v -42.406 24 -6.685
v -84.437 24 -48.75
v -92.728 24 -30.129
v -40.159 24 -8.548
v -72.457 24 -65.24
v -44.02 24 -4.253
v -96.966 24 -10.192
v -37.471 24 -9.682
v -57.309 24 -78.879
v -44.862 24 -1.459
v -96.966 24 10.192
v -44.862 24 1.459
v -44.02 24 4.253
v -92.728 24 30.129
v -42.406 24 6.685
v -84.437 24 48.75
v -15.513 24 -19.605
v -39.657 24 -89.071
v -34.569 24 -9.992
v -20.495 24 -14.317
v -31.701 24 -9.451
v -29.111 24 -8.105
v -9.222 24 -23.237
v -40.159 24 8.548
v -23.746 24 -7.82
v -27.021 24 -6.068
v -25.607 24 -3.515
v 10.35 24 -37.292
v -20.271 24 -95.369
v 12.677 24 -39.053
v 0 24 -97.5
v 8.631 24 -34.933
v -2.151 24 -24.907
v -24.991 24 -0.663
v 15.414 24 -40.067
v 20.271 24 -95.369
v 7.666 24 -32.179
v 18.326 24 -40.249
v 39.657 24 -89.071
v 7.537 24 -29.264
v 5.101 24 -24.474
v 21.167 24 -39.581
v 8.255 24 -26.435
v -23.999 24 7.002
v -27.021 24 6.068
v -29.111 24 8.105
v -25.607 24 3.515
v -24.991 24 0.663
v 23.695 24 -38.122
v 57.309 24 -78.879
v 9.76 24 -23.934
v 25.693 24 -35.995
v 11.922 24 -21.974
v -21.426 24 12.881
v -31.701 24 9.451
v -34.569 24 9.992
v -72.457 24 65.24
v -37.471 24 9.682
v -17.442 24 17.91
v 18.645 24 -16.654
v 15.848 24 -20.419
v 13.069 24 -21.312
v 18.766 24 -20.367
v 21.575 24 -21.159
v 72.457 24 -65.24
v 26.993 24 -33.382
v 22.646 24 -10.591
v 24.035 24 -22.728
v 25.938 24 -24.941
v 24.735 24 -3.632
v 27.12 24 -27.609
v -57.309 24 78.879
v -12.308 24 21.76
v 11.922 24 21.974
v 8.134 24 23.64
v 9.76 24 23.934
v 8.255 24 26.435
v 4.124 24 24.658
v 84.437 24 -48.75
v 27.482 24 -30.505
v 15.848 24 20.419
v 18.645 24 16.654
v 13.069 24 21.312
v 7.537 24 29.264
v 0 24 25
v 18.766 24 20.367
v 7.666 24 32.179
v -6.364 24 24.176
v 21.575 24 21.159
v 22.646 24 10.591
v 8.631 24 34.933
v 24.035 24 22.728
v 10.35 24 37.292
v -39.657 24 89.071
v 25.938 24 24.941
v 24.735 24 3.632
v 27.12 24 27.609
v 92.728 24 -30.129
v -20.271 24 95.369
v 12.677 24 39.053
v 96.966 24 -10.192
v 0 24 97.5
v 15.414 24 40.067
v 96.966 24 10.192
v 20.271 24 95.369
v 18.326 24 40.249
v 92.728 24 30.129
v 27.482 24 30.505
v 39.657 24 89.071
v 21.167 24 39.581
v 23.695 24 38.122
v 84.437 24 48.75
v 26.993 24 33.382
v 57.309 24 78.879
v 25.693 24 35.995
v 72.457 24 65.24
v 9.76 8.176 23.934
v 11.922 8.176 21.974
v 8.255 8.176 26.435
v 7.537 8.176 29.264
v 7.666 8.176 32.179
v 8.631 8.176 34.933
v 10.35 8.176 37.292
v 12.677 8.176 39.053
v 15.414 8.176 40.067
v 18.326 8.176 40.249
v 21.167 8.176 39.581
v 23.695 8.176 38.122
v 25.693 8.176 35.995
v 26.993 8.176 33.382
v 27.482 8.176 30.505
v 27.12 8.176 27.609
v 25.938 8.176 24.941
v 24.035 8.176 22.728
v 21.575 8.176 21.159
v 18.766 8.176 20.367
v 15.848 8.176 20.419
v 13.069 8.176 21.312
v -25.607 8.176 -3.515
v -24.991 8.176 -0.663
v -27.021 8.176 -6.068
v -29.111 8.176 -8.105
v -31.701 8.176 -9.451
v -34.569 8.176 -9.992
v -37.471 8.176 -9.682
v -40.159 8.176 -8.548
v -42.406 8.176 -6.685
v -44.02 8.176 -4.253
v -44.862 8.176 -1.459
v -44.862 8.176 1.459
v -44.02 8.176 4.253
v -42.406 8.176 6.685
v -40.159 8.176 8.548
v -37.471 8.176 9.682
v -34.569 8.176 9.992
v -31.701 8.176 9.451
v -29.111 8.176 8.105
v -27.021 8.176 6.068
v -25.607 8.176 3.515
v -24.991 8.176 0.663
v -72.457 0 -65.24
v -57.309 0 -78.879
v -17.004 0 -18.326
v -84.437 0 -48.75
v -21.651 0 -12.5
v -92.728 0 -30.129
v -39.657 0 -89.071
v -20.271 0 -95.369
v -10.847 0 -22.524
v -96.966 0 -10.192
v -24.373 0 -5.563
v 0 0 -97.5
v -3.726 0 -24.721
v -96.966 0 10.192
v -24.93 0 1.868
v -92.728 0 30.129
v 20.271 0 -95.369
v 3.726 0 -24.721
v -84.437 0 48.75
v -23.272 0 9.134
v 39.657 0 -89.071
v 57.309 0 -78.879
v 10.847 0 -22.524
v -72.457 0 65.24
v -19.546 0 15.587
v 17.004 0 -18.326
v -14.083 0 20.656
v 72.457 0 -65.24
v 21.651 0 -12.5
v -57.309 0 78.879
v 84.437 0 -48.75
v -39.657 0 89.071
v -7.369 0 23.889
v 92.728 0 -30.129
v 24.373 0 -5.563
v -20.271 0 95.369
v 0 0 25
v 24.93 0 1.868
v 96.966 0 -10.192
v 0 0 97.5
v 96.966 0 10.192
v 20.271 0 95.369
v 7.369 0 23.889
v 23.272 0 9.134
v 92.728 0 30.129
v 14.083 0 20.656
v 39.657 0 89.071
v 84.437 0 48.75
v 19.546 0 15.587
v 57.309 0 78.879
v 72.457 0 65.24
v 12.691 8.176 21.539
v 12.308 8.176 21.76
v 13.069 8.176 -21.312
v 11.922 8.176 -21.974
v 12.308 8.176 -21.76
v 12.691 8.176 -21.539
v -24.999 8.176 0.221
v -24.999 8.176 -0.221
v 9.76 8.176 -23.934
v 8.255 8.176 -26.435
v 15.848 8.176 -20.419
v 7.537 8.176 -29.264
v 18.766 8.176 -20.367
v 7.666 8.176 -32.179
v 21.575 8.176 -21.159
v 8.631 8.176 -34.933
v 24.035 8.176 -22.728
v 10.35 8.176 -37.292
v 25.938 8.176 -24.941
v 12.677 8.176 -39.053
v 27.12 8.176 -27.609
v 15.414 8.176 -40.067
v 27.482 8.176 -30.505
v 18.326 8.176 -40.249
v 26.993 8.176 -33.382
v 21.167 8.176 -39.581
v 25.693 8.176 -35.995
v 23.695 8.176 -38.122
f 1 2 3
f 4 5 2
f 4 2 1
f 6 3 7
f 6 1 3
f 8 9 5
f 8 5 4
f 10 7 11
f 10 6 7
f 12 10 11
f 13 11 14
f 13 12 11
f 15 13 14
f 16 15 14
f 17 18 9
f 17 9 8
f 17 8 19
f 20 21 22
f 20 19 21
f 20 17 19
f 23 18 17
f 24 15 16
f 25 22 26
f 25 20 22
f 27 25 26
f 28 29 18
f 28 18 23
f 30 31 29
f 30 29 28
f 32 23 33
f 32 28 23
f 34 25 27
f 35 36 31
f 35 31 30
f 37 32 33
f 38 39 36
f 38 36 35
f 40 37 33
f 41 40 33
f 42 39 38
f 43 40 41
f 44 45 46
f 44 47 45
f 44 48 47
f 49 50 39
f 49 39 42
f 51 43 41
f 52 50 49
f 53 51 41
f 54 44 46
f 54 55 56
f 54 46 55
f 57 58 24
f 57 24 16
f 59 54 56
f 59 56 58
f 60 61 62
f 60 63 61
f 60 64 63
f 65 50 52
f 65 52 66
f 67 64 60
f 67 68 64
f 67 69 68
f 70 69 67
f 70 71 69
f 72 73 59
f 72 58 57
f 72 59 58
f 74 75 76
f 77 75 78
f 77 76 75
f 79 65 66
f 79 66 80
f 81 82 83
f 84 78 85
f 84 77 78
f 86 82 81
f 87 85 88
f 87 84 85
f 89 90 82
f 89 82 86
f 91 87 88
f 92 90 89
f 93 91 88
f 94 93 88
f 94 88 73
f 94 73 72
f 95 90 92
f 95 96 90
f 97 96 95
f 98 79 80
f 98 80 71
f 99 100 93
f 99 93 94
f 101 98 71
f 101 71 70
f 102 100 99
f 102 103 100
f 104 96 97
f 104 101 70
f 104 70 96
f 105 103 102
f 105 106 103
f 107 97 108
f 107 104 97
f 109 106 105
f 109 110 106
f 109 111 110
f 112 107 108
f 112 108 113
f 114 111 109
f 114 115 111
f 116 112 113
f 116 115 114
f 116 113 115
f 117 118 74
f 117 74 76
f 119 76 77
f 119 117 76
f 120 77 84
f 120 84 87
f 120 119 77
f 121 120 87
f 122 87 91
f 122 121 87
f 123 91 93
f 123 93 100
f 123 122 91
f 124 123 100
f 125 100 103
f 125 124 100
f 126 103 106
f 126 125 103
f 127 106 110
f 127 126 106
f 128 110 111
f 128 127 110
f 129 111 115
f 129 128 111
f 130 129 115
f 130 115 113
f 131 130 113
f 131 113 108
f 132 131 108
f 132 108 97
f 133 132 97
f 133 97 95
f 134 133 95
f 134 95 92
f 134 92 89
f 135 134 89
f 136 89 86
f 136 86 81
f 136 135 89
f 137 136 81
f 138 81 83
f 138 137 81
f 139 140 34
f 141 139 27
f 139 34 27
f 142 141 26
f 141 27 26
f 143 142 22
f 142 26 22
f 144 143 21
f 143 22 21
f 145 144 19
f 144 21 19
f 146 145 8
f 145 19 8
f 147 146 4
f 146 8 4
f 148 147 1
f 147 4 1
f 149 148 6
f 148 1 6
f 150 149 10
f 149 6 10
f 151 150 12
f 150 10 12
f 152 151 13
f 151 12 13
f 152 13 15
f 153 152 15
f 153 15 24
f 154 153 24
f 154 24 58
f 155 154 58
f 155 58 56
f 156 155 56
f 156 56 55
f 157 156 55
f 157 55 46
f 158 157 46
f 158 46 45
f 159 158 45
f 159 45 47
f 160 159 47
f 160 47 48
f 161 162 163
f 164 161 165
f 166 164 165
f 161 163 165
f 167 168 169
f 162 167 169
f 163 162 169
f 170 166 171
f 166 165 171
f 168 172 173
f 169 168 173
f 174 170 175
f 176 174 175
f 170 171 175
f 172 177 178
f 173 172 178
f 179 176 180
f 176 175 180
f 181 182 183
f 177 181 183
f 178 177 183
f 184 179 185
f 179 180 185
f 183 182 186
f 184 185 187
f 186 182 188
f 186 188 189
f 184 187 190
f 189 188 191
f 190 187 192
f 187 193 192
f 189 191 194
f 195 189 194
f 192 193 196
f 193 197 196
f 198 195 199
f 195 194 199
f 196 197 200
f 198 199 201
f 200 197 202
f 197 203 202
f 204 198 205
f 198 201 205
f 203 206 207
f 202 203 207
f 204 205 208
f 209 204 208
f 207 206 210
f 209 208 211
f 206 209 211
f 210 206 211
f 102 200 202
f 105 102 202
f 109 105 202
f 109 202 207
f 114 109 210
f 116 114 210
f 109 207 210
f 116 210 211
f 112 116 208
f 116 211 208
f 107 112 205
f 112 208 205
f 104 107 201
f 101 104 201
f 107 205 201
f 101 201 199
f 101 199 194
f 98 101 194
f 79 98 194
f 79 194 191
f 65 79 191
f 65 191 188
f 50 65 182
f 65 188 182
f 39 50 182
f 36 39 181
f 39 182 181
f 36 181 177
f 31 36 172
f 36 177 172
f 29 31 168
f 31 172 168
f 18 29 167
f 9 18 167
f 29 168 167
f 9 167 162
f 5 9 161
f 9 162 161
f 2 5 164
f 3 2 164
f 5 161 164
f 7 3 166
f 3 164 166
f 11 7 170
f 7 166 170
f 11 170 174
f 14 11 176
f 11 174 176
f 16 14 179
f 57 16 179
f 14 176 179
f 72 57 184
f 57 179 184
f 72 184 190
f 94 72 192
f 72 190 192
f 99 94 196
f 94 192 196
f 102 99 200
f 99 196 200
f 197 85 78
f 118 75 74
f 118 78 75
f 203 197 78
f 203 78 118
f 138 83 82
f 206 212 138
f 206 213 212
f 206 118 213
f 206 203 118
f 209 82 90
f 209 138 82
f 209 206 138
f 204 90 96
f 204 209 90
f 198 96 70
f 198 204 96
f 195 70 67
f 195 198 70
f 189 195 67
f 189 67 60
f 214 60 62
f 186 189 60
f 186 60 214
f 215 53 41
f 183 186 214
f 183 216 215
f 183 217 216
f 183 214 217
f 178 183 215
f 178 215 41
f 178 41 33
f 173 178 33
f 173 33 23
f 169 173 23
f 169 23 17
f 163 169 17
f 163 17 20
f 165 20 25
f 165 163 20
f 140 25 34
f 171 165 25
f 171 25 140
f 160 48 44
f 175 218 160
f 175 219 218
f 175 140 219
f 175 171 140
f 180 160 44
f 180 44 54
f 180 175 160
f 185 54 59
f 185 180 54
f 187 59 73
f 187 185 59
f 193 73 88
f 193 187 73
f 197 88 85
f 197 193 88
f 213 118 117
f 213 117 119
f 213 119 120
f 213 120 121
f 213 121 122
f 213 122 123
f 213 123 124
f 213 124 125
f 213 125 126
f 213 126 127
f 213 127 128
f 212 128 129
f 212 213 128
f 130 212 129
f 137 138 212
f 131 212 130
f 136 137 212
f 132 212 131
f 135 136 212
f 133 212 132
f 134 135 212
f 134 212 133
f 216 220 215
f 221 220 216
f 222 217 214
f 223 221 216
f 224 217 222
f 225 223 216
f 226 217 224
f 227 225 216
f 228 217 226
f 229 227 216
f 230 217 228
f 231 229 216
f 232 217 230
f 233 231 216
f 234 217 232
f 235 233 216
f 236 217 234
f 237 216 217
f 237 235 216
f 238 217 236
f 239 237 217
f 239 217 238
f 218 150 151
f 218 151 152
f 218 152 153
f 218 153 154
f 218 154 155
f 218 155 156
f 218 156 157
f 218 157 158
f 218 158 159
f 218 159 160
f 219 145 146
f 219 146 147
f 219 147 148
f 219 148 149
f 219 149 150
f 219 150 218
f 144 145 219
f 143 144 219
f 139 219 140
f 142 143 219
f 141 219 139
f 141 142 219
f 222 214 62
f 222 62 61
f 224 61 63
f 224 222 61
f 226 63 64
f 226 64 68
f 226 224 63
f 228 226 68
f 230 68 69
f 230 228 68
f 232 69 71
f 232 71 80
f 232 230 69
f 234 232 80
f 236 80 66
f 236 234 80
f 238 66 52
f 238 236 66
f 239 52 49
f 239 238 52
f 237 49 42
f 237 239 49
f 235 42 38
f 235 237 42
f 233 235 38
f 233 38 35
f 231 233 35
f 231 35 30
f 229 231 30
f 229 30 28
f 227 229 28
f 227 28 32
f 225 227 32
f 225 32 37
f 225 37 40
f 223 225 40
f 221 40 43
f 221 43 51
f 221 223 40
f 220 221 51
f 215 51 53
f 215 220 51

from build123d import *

# Parameters (mm, degrees)
SKETCH1_R           = 97.5
BOSS_EXTRUDE1_DEPTH = 24
SKETCH2_R           = 25
CUT_EXTRUDE1_DEPTH  = 140.958922545
SKETCH3_R           = 10
CUT_EXTRUDE2_DEPTH  = 15.823761425
CIRPATTERN1_COUNT   = 3


with BuildPart() as part:
    # Sketch1 → Boss-Extrude1 (new body)
    with BuildSketch(Plane(origin=(0, 0, 0), x_dir=(1, 0, 0), z_dir=(0, 1, 0))):
        Circle(SKETCH1_R)
    extrude(amount=BOSS_EXTRUDE1_DEPTH)

    # Sketch2 → Cut-Extrude1 (cut, through all)
    with BuildSketch(Plane(origin=(0, 0, 0), x_dir=(1, 0, 0), z_dir=(0, 1, 0))):
        Circle(SKETCH2_R)
    extrude(amount=CUT_EXTRUDE1_DEPTH, mode=Mode.SUBTRACT)

    # Sketch3 → Cut-Extrude2 (cut)
    with BuildSketch(Plane(origin=(0, 24, 0), x_dir=(1, 0, 0), z_dir=(0, 1, 0))):
        with Locations((-34.969247783, 0)):
            Circle(SKETCH3_R)
    cut_extrude2 = extrude(amount=-CUT_EXTRUDE2_DEPTH, mode=Mode.SUBTRACT)

    # CirPattern1: Cut-Extrude2 ×3 about axis
    cirpattern1_axis = Axis((0, 0, 0), (0, 1, 0))
    for i in range(1, CIRPATTERN1_COUNT):
        add(cut_extrude2.rotate(cirpattern1_axis, i * 360 / CIRPATTERN1_COUNT), mode=Mode.SUBTRACT)


solid = part.part
